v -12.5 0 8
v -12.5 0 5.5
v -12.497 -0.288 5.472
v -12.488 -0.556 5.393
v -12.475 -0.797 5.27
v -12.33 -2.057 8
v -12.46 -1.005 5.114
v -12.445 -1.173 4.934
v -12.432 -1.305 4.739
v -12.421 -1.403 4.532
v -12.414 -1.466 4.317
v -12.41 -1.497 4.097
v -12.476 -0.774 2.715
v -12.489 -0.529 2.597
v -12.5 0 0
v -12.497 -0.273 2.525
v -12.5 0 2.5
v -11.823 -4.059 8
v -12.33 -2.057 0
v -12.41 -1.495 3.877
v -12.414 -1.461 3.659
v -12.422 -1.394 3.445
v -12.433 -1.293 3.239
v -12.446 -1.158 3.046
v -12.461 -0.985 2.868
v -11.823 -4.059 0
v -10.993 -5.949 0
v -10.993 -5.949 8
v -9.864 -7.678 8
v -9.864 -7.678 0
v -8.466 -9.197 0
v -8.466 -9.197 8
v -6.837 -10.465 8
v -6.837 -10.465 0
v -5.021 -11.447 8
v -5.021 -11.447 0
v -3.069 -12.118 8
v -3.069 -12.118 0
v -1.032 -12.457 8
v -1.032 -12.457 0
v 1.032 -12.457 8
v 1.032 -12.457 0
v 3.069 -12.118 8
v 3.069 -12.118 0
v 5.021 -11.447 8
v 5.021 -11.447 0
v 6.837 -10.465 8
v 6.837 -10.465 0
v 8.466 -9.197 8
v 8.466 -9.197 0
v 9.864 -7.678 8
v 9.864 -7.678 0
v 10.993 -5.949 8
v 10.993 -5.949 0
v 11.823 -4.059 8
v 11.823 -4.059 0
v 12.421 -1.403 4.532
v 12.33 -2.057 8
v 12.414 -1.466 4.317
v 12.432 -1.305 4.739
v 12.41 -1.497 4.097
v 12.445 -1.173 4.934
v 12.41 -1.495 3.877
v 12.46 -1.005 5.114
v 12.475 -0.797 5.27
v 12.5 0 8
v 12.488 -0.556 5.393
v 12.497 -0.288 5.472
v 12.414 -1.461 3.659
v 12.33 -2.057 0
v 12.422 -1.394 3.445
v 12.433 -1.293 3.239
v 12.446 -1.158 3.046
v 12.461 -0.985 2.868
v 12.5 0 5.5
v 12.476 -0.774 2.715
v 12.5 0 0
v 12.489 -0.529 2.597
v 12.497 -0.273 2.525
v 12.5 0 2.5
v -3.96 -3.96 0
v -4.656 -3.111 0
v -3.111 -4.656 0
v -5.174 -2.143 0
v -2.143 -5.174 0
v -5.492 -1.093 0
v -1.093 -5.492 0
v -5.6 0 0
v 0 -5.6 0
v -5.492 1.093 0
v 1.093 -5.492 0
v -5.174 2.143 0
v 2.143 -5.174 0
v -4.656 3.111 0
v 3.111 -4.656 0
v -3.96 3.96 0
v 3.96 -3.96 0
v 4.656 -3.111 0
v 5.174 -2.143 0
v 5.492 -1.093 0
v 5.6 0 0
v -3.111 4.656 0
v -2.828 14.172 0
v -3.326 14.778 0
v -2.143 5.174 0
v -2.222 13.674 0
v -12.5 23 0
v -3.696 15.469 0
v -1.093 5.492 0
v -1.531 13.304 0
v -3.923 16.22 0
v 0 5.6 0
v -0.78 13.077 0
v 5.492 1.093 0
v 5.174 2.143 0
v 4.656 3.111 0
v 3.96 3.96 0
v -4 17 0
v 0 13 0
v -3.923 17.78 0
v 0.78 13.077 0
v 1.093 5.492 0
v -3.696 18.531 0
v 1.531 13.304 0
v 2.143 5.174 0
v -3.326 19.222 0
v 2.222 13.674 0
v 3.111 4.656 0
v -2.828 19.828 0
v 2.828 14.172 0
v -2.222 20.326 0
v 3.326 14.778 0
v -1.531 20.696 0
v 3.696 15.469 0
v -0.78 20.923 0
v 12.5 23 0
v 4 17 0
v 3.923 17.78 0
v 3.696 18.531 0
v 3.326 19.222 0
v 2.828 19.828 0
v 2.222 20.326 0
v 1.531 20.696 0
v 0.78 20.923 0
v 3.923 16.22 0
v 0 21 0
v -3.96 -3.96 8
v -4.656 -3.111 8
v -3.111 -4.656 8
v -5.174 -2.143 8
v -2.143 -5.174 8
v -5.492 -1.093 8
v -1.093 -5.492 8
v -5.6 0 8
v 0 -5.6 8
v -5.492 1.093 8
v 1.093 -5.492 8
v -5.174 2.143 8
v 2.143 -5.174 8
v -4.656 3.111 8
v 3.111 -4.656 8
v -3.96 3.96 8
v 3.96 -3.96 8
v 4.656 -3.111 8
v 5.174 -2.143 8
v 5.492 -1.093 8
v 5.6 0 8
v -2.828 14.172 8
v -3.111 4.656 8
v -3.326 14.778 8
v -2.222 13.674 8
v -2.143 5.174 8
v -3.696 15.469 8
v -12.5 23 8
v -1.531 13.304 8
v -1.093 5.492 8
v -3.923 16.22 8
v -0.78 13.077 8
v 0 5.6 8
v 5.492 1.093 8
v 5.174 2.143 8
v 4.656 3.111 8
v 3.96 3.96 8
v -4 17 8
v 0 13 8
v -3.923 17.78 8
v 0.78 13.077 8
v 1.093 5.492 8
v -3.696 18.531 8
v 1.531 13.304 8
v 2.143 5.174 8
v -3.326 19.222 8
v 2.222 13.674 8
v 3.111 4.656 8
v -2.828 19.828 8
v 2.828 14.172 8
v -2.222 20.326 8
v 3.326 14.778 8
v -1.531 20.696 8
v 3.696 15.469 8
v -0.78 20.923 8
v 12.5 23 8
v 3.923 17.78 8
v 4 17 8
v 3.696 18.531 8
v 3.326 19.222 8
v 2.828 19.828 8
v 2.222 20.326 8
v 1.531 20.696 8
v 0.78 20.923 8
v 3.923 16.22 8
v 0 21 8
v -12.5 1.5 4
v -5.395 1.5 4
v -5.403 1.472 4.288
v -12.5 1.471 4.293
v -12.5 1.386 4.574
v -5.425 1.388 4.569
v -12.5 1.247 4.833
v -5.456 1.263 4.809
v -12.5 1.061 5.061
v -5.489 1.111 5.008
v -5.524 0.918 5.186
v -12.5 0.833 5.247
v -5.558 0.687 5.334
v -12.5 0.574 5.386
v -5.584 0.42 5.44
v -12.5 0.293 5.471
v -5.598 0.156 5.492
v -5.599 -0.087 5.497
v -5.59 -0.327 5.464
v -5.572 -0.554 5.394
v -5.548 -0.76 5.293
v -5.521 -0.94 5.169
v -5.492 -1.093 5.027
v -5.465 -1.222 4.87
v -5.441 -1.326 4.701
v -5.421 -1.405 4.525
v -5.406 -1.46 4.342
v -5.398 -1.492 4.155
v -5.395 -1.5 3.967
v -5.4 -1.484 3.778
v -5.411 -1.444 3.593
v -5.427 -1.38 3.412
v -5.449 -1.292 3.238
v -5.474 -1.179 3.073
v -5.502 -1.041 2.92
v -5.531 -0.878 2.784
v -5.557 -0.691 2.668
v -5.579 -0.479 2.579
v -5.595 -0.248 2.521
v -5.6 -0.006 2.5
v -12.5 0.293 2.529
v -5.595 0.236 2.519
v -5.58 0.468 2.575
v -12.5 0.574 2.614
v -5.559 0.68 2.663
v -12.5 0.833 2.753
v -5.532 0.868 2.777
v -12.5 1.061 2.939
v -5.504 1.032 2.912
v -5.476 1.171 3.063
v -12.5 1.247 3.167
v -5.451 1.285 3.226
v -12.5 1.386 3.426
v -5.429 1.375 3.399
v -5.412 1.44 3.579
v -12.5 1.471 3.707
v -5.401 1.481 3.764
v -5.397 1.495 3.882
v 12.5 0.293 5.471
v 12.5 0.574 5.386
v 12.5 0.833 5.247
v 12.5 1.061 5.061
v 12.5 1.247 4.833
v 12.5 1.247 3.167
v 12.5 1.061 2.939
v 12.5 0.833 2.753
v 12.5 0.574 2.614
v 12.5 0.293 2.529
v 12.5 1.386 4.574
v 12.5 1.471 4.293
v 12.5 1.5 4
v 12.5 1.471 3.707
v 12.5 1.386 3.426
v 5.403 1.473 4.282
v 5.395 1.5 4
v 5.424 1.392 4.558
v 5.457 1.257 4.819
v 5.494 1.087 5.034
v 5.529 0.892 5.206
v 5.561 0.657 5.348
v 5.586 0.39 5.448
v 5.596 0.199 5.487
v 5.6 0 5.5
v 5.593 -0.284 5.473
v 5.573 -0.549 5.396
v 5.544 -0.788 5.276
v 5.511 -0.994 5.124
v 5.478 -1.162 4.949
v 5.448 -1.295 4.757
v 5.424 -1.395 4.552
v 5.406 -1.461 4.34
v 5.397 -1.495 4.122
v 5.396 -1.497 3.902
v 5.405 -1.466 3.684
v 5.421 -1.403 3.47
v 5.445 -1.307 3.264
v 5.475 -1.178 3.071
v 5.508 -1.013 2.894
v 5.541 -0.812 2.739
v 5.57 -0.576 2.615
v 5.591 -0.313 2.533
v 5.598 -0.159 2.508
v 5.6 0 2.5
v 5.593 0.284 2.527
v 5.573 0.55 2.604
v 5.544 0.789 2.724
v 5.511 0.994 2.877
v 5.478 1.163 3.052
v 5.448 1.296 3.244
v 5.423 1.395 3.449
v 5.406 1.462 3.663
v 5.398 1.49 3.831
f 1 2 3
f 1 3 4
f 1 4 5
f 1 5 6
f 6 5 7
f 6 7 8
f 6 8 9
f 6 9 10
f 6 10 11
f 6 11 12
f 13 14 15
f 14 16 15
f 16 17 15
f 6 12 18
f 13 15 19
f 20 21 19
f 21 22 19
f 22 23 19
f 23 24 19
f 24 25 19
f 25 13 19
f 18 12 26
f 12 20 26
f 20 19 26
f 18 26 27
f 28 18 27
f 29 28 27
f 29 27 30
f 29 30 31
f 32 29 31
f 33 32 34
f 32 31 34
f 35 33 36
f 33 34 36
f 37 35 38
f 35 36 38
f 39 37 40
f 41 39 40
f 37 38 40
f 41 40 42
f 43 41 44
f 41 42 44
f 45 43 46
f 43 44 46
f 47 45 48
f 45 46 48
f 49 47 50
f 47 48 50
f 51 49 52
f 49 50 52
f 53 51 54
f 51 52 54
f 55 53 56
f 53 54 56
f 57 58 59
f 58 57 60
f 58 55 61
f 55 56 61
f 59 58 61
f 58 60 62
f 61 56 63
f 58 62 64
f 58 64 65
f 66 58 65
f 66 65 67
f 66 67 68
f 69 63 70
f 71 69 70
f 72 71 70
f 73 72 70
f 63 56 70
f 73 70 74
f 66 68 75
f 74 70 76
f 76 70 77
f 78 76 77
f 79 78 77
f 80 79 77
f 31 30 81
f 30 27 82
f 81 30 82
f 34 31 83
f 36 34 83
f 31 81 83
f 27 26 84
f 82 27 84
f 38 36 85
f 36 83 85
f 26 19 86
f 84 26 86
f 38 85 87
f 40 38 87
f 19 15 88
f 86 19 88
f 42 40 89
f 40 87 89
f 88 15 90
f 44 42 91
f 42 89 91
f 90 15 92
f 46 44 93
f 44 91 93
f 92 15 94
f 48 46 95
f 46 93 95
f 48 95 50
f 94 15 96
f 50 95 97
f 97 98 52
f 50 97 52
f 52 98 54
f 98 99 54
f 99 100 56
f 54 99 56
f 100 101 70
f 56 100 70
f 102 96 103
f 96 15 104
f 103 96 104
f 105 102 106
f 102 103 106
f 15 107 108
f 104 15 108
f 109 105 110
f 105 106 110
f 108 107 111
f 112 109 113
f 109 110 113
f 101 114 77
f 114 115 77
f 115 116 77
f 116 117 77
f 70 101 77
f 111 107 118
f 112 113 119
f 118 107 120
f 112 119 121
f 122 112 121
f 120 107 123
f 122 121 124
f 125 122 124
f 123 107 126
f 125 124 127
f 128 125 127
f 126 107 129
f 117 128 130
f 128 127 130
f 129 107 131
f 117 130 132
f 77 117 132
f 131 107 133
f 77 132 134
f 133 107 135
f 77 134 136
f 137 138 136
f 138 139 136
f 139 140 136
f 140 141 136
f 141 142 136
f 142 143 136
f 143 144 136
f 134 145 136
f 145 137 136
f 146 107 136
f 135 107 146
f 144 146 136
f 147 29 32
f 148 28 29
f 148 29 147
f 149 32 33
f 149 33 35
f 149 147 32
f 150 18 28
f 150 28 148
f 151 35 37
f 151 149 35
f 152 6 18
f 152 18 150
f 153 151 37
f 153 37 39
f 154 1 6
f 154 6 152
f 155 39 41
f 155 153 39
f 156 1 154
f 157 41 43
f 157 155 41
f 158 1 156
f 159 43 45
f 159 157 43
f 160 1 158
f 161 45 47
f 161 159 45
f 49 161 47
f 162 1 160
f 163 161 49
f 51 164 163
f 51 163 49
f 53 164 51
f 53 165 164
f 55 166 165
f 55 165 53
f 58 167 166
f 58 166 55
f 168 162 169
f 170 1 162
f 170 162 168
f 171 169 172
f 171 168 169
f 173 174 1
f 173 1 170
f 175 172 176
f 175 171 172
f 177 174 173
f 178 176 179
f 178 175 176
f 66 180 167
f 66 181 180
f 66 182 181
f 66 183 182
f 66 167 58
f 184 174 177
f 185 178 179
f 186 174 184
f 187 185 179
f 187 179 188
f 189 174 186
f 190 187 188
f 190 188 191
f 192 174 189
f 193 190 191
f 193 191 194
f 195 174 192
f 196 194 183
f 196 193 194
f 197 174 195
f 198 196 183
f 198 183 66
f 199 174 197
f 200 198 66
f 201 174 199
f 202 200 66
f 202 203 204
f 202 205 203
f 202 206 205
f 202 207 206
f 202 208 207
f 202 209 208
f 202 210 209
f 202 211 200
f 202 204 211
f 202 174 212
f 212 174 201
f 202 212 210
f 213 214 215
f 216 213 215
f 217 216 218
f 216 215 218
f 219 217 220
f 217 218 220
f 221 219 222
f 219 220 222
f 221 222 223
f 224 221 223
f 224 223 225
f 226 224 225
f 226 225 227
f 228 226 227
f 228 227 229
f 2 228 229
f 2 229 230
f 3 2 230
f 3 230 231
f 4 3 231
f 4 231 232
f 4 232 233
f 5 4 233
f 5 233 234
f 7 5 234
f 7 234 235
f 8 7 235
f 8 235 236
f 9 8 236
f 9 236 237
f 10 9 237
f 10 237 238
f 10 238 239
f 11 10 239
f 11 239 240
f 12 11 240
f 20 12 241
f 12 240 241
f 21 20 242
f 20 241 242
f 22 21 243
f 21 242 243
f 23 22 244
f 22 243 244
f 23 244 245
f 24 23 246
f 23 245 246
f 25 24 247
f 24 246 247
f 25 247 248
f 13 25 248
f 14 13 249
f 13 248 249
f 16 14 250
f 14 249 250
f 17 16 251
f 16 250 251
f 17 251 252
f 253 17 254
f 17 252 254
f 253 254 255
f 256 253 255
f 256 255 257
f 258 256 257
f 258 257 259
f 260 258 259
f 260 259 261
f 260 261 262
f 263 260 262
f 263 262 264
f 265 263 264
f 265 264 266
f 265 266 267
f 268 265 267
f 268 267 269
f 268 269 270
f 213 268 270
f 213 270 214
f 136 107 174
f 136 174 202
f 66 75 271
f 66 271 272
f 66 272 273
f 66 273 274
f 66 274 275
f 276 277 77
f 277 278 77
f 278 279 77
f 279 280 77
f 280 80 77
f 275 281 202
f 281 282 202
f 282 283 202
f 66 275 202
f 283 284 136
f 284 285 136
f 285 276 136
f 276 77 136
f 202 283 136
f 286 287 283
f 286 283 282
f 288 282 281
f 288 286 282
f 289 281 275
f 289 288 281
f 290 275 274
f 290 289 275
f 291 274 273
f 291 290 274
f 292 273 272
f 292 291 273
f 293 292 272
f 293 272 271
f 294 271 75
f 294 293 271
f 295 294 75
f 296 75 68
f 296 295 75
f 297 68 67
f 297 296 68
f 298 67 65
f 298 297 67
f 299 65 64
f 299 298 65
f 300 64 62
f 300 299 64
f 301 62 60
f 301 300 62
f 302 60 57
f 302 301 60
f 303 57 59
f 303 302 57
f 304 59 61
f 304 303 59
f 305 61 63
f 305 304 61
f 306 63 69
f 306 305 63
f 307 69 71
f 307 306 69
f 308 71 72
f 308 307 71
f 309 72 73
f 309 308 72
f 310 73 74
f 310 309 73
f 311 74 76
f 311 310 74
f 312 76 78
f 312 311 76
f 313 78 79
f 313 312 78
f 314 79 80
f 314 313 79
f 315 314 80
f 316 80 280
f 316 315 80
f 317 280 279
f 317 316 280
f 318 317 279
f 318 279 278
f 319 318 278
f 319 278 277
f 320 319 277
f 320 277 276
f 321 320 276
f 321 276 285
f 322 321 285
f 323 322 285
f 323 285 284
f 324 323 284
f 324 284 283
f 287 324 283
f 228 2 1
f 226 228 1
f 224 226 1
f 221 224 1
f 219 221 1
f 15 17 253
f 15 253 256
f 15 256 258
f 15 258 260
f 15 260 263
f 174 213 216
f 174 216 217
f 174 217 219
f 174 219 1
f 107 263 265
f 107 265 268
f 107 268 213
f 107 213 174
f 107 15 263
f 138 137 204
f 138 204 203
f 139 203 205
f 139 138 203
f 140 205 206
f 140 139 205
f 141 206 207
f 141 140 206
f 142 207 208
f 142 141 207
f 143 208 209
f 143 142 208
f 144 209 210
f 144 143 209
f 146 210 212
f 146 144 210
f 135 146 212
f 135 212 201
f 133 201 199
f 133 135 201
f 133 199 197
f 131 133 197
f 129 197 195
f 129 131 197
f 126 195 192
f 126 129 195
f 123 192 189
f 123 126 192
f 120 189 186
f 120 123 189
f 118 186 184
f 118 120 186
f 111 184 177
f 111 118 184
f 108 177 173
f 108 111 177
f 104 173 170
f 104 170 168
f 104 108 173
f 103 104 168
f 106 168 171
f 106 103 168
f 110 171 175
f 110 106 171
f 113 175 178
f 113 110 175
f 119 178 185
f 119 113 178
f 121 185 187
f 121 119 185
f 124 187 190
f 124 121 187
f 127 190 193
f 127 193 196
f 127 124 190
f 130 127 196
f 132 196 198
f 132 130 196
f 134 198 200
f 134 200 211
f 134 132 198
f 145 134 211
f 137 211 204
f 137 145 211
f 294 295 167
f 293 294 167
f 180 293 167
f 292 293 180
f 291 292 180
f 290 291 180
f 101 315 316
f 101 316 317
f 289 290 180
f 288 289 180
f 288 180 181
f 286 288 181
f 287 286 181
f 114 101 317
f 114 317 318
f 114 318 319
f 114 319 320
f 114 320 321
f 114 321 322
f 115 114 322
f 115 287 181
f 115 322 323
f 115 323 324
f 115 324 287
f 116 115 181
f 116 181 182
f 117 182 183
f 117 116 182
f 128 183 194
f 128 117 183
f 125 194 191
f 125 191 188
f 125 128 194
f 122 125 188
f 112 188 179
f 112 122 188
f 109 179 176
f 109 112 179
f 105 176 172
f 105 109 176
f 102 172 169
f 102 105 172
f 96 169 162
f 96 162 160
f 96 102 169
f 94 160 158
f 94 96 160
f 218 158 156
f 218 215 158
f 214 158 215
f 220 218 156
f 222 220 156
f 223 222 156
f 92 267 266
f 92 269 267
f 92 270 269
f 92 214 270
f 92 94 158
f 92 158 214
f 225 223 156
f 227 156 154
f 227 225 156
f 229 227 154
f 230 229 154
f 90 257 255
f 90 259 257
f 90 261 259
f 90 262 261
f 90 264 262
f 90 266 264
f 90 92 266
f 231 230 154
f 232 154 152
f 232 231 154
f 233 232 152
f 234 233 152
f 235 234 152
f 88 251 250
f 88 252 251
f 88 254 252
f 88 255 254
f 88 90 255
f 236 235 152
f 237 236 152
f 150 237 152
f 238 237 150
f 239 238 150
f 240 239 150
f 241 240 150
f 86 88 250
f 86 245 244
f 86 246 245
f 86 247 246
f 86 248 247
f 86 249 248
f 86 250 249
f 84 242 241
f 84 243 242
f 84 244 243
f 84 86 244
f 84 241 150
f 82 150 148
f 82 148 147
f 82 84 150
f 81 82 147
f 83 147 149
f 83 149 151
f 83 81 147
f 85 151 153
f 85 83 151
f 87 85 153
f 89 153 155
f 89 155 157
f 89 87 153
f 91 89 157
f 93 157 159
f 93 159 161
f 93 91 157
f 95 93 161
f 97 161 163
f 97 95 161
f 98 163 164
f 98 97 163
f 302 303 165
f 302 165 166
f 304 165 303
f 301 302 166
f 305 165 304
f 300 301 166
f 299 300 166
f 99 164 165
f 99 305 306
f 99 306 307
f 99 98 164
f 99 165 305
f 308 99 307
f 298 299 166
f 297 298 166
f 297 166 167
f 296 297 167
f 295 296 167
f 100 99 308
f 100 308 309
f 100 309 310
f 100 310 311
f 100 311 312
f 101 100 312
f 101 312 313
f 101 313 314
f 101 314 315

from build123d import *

# Parameters (mm, degrees)
SKETCH_R          = 5.6
SKETCH_R_2        = 4
PAD_DEPTH         = 8
SKETCH001_R       = 1.5
POCKET_DEPTH      = 100
POCKET_DEPTH_BACK = 100


with BuildPart() as part:
    # Sketch → Pad (new body)
    with BuildSketch(Plane.XY):
        with BuildLine():
            ThreePointArc((-12.5, 0), (0, -12.5), (12.5, 0))
            Line((12.5, 0), (12.5, 23))
            Line((-12.5, 23), (12.5, 23))
            Line((-12.5, 0), (-12.5, 23))
        make_face()
        Circle(SKETCH_R, mode=Mode.SUBTRACT)
        with Locations((0, 17)):
            Circle(SKETCH_R_2, mode=Mode.SUBTRACT)
    extrude(amount=PAD_DEPTH)

    # Sketch001 → Pocket (cut, two sides)
    with BuildSketch(Plane.YZ) as pocket_sk:
        with Locations((0, 4)):
            Circle(SKETCH001_R)
    extrude(amount=-POCKET_DEPTH, mode=Mode.SUBTRACT)
    extrude(pocket_sk.sketch, amount=POCKET_DEPTH_BACK, mode=Mode.SUBTRACT)


solid = part.part
